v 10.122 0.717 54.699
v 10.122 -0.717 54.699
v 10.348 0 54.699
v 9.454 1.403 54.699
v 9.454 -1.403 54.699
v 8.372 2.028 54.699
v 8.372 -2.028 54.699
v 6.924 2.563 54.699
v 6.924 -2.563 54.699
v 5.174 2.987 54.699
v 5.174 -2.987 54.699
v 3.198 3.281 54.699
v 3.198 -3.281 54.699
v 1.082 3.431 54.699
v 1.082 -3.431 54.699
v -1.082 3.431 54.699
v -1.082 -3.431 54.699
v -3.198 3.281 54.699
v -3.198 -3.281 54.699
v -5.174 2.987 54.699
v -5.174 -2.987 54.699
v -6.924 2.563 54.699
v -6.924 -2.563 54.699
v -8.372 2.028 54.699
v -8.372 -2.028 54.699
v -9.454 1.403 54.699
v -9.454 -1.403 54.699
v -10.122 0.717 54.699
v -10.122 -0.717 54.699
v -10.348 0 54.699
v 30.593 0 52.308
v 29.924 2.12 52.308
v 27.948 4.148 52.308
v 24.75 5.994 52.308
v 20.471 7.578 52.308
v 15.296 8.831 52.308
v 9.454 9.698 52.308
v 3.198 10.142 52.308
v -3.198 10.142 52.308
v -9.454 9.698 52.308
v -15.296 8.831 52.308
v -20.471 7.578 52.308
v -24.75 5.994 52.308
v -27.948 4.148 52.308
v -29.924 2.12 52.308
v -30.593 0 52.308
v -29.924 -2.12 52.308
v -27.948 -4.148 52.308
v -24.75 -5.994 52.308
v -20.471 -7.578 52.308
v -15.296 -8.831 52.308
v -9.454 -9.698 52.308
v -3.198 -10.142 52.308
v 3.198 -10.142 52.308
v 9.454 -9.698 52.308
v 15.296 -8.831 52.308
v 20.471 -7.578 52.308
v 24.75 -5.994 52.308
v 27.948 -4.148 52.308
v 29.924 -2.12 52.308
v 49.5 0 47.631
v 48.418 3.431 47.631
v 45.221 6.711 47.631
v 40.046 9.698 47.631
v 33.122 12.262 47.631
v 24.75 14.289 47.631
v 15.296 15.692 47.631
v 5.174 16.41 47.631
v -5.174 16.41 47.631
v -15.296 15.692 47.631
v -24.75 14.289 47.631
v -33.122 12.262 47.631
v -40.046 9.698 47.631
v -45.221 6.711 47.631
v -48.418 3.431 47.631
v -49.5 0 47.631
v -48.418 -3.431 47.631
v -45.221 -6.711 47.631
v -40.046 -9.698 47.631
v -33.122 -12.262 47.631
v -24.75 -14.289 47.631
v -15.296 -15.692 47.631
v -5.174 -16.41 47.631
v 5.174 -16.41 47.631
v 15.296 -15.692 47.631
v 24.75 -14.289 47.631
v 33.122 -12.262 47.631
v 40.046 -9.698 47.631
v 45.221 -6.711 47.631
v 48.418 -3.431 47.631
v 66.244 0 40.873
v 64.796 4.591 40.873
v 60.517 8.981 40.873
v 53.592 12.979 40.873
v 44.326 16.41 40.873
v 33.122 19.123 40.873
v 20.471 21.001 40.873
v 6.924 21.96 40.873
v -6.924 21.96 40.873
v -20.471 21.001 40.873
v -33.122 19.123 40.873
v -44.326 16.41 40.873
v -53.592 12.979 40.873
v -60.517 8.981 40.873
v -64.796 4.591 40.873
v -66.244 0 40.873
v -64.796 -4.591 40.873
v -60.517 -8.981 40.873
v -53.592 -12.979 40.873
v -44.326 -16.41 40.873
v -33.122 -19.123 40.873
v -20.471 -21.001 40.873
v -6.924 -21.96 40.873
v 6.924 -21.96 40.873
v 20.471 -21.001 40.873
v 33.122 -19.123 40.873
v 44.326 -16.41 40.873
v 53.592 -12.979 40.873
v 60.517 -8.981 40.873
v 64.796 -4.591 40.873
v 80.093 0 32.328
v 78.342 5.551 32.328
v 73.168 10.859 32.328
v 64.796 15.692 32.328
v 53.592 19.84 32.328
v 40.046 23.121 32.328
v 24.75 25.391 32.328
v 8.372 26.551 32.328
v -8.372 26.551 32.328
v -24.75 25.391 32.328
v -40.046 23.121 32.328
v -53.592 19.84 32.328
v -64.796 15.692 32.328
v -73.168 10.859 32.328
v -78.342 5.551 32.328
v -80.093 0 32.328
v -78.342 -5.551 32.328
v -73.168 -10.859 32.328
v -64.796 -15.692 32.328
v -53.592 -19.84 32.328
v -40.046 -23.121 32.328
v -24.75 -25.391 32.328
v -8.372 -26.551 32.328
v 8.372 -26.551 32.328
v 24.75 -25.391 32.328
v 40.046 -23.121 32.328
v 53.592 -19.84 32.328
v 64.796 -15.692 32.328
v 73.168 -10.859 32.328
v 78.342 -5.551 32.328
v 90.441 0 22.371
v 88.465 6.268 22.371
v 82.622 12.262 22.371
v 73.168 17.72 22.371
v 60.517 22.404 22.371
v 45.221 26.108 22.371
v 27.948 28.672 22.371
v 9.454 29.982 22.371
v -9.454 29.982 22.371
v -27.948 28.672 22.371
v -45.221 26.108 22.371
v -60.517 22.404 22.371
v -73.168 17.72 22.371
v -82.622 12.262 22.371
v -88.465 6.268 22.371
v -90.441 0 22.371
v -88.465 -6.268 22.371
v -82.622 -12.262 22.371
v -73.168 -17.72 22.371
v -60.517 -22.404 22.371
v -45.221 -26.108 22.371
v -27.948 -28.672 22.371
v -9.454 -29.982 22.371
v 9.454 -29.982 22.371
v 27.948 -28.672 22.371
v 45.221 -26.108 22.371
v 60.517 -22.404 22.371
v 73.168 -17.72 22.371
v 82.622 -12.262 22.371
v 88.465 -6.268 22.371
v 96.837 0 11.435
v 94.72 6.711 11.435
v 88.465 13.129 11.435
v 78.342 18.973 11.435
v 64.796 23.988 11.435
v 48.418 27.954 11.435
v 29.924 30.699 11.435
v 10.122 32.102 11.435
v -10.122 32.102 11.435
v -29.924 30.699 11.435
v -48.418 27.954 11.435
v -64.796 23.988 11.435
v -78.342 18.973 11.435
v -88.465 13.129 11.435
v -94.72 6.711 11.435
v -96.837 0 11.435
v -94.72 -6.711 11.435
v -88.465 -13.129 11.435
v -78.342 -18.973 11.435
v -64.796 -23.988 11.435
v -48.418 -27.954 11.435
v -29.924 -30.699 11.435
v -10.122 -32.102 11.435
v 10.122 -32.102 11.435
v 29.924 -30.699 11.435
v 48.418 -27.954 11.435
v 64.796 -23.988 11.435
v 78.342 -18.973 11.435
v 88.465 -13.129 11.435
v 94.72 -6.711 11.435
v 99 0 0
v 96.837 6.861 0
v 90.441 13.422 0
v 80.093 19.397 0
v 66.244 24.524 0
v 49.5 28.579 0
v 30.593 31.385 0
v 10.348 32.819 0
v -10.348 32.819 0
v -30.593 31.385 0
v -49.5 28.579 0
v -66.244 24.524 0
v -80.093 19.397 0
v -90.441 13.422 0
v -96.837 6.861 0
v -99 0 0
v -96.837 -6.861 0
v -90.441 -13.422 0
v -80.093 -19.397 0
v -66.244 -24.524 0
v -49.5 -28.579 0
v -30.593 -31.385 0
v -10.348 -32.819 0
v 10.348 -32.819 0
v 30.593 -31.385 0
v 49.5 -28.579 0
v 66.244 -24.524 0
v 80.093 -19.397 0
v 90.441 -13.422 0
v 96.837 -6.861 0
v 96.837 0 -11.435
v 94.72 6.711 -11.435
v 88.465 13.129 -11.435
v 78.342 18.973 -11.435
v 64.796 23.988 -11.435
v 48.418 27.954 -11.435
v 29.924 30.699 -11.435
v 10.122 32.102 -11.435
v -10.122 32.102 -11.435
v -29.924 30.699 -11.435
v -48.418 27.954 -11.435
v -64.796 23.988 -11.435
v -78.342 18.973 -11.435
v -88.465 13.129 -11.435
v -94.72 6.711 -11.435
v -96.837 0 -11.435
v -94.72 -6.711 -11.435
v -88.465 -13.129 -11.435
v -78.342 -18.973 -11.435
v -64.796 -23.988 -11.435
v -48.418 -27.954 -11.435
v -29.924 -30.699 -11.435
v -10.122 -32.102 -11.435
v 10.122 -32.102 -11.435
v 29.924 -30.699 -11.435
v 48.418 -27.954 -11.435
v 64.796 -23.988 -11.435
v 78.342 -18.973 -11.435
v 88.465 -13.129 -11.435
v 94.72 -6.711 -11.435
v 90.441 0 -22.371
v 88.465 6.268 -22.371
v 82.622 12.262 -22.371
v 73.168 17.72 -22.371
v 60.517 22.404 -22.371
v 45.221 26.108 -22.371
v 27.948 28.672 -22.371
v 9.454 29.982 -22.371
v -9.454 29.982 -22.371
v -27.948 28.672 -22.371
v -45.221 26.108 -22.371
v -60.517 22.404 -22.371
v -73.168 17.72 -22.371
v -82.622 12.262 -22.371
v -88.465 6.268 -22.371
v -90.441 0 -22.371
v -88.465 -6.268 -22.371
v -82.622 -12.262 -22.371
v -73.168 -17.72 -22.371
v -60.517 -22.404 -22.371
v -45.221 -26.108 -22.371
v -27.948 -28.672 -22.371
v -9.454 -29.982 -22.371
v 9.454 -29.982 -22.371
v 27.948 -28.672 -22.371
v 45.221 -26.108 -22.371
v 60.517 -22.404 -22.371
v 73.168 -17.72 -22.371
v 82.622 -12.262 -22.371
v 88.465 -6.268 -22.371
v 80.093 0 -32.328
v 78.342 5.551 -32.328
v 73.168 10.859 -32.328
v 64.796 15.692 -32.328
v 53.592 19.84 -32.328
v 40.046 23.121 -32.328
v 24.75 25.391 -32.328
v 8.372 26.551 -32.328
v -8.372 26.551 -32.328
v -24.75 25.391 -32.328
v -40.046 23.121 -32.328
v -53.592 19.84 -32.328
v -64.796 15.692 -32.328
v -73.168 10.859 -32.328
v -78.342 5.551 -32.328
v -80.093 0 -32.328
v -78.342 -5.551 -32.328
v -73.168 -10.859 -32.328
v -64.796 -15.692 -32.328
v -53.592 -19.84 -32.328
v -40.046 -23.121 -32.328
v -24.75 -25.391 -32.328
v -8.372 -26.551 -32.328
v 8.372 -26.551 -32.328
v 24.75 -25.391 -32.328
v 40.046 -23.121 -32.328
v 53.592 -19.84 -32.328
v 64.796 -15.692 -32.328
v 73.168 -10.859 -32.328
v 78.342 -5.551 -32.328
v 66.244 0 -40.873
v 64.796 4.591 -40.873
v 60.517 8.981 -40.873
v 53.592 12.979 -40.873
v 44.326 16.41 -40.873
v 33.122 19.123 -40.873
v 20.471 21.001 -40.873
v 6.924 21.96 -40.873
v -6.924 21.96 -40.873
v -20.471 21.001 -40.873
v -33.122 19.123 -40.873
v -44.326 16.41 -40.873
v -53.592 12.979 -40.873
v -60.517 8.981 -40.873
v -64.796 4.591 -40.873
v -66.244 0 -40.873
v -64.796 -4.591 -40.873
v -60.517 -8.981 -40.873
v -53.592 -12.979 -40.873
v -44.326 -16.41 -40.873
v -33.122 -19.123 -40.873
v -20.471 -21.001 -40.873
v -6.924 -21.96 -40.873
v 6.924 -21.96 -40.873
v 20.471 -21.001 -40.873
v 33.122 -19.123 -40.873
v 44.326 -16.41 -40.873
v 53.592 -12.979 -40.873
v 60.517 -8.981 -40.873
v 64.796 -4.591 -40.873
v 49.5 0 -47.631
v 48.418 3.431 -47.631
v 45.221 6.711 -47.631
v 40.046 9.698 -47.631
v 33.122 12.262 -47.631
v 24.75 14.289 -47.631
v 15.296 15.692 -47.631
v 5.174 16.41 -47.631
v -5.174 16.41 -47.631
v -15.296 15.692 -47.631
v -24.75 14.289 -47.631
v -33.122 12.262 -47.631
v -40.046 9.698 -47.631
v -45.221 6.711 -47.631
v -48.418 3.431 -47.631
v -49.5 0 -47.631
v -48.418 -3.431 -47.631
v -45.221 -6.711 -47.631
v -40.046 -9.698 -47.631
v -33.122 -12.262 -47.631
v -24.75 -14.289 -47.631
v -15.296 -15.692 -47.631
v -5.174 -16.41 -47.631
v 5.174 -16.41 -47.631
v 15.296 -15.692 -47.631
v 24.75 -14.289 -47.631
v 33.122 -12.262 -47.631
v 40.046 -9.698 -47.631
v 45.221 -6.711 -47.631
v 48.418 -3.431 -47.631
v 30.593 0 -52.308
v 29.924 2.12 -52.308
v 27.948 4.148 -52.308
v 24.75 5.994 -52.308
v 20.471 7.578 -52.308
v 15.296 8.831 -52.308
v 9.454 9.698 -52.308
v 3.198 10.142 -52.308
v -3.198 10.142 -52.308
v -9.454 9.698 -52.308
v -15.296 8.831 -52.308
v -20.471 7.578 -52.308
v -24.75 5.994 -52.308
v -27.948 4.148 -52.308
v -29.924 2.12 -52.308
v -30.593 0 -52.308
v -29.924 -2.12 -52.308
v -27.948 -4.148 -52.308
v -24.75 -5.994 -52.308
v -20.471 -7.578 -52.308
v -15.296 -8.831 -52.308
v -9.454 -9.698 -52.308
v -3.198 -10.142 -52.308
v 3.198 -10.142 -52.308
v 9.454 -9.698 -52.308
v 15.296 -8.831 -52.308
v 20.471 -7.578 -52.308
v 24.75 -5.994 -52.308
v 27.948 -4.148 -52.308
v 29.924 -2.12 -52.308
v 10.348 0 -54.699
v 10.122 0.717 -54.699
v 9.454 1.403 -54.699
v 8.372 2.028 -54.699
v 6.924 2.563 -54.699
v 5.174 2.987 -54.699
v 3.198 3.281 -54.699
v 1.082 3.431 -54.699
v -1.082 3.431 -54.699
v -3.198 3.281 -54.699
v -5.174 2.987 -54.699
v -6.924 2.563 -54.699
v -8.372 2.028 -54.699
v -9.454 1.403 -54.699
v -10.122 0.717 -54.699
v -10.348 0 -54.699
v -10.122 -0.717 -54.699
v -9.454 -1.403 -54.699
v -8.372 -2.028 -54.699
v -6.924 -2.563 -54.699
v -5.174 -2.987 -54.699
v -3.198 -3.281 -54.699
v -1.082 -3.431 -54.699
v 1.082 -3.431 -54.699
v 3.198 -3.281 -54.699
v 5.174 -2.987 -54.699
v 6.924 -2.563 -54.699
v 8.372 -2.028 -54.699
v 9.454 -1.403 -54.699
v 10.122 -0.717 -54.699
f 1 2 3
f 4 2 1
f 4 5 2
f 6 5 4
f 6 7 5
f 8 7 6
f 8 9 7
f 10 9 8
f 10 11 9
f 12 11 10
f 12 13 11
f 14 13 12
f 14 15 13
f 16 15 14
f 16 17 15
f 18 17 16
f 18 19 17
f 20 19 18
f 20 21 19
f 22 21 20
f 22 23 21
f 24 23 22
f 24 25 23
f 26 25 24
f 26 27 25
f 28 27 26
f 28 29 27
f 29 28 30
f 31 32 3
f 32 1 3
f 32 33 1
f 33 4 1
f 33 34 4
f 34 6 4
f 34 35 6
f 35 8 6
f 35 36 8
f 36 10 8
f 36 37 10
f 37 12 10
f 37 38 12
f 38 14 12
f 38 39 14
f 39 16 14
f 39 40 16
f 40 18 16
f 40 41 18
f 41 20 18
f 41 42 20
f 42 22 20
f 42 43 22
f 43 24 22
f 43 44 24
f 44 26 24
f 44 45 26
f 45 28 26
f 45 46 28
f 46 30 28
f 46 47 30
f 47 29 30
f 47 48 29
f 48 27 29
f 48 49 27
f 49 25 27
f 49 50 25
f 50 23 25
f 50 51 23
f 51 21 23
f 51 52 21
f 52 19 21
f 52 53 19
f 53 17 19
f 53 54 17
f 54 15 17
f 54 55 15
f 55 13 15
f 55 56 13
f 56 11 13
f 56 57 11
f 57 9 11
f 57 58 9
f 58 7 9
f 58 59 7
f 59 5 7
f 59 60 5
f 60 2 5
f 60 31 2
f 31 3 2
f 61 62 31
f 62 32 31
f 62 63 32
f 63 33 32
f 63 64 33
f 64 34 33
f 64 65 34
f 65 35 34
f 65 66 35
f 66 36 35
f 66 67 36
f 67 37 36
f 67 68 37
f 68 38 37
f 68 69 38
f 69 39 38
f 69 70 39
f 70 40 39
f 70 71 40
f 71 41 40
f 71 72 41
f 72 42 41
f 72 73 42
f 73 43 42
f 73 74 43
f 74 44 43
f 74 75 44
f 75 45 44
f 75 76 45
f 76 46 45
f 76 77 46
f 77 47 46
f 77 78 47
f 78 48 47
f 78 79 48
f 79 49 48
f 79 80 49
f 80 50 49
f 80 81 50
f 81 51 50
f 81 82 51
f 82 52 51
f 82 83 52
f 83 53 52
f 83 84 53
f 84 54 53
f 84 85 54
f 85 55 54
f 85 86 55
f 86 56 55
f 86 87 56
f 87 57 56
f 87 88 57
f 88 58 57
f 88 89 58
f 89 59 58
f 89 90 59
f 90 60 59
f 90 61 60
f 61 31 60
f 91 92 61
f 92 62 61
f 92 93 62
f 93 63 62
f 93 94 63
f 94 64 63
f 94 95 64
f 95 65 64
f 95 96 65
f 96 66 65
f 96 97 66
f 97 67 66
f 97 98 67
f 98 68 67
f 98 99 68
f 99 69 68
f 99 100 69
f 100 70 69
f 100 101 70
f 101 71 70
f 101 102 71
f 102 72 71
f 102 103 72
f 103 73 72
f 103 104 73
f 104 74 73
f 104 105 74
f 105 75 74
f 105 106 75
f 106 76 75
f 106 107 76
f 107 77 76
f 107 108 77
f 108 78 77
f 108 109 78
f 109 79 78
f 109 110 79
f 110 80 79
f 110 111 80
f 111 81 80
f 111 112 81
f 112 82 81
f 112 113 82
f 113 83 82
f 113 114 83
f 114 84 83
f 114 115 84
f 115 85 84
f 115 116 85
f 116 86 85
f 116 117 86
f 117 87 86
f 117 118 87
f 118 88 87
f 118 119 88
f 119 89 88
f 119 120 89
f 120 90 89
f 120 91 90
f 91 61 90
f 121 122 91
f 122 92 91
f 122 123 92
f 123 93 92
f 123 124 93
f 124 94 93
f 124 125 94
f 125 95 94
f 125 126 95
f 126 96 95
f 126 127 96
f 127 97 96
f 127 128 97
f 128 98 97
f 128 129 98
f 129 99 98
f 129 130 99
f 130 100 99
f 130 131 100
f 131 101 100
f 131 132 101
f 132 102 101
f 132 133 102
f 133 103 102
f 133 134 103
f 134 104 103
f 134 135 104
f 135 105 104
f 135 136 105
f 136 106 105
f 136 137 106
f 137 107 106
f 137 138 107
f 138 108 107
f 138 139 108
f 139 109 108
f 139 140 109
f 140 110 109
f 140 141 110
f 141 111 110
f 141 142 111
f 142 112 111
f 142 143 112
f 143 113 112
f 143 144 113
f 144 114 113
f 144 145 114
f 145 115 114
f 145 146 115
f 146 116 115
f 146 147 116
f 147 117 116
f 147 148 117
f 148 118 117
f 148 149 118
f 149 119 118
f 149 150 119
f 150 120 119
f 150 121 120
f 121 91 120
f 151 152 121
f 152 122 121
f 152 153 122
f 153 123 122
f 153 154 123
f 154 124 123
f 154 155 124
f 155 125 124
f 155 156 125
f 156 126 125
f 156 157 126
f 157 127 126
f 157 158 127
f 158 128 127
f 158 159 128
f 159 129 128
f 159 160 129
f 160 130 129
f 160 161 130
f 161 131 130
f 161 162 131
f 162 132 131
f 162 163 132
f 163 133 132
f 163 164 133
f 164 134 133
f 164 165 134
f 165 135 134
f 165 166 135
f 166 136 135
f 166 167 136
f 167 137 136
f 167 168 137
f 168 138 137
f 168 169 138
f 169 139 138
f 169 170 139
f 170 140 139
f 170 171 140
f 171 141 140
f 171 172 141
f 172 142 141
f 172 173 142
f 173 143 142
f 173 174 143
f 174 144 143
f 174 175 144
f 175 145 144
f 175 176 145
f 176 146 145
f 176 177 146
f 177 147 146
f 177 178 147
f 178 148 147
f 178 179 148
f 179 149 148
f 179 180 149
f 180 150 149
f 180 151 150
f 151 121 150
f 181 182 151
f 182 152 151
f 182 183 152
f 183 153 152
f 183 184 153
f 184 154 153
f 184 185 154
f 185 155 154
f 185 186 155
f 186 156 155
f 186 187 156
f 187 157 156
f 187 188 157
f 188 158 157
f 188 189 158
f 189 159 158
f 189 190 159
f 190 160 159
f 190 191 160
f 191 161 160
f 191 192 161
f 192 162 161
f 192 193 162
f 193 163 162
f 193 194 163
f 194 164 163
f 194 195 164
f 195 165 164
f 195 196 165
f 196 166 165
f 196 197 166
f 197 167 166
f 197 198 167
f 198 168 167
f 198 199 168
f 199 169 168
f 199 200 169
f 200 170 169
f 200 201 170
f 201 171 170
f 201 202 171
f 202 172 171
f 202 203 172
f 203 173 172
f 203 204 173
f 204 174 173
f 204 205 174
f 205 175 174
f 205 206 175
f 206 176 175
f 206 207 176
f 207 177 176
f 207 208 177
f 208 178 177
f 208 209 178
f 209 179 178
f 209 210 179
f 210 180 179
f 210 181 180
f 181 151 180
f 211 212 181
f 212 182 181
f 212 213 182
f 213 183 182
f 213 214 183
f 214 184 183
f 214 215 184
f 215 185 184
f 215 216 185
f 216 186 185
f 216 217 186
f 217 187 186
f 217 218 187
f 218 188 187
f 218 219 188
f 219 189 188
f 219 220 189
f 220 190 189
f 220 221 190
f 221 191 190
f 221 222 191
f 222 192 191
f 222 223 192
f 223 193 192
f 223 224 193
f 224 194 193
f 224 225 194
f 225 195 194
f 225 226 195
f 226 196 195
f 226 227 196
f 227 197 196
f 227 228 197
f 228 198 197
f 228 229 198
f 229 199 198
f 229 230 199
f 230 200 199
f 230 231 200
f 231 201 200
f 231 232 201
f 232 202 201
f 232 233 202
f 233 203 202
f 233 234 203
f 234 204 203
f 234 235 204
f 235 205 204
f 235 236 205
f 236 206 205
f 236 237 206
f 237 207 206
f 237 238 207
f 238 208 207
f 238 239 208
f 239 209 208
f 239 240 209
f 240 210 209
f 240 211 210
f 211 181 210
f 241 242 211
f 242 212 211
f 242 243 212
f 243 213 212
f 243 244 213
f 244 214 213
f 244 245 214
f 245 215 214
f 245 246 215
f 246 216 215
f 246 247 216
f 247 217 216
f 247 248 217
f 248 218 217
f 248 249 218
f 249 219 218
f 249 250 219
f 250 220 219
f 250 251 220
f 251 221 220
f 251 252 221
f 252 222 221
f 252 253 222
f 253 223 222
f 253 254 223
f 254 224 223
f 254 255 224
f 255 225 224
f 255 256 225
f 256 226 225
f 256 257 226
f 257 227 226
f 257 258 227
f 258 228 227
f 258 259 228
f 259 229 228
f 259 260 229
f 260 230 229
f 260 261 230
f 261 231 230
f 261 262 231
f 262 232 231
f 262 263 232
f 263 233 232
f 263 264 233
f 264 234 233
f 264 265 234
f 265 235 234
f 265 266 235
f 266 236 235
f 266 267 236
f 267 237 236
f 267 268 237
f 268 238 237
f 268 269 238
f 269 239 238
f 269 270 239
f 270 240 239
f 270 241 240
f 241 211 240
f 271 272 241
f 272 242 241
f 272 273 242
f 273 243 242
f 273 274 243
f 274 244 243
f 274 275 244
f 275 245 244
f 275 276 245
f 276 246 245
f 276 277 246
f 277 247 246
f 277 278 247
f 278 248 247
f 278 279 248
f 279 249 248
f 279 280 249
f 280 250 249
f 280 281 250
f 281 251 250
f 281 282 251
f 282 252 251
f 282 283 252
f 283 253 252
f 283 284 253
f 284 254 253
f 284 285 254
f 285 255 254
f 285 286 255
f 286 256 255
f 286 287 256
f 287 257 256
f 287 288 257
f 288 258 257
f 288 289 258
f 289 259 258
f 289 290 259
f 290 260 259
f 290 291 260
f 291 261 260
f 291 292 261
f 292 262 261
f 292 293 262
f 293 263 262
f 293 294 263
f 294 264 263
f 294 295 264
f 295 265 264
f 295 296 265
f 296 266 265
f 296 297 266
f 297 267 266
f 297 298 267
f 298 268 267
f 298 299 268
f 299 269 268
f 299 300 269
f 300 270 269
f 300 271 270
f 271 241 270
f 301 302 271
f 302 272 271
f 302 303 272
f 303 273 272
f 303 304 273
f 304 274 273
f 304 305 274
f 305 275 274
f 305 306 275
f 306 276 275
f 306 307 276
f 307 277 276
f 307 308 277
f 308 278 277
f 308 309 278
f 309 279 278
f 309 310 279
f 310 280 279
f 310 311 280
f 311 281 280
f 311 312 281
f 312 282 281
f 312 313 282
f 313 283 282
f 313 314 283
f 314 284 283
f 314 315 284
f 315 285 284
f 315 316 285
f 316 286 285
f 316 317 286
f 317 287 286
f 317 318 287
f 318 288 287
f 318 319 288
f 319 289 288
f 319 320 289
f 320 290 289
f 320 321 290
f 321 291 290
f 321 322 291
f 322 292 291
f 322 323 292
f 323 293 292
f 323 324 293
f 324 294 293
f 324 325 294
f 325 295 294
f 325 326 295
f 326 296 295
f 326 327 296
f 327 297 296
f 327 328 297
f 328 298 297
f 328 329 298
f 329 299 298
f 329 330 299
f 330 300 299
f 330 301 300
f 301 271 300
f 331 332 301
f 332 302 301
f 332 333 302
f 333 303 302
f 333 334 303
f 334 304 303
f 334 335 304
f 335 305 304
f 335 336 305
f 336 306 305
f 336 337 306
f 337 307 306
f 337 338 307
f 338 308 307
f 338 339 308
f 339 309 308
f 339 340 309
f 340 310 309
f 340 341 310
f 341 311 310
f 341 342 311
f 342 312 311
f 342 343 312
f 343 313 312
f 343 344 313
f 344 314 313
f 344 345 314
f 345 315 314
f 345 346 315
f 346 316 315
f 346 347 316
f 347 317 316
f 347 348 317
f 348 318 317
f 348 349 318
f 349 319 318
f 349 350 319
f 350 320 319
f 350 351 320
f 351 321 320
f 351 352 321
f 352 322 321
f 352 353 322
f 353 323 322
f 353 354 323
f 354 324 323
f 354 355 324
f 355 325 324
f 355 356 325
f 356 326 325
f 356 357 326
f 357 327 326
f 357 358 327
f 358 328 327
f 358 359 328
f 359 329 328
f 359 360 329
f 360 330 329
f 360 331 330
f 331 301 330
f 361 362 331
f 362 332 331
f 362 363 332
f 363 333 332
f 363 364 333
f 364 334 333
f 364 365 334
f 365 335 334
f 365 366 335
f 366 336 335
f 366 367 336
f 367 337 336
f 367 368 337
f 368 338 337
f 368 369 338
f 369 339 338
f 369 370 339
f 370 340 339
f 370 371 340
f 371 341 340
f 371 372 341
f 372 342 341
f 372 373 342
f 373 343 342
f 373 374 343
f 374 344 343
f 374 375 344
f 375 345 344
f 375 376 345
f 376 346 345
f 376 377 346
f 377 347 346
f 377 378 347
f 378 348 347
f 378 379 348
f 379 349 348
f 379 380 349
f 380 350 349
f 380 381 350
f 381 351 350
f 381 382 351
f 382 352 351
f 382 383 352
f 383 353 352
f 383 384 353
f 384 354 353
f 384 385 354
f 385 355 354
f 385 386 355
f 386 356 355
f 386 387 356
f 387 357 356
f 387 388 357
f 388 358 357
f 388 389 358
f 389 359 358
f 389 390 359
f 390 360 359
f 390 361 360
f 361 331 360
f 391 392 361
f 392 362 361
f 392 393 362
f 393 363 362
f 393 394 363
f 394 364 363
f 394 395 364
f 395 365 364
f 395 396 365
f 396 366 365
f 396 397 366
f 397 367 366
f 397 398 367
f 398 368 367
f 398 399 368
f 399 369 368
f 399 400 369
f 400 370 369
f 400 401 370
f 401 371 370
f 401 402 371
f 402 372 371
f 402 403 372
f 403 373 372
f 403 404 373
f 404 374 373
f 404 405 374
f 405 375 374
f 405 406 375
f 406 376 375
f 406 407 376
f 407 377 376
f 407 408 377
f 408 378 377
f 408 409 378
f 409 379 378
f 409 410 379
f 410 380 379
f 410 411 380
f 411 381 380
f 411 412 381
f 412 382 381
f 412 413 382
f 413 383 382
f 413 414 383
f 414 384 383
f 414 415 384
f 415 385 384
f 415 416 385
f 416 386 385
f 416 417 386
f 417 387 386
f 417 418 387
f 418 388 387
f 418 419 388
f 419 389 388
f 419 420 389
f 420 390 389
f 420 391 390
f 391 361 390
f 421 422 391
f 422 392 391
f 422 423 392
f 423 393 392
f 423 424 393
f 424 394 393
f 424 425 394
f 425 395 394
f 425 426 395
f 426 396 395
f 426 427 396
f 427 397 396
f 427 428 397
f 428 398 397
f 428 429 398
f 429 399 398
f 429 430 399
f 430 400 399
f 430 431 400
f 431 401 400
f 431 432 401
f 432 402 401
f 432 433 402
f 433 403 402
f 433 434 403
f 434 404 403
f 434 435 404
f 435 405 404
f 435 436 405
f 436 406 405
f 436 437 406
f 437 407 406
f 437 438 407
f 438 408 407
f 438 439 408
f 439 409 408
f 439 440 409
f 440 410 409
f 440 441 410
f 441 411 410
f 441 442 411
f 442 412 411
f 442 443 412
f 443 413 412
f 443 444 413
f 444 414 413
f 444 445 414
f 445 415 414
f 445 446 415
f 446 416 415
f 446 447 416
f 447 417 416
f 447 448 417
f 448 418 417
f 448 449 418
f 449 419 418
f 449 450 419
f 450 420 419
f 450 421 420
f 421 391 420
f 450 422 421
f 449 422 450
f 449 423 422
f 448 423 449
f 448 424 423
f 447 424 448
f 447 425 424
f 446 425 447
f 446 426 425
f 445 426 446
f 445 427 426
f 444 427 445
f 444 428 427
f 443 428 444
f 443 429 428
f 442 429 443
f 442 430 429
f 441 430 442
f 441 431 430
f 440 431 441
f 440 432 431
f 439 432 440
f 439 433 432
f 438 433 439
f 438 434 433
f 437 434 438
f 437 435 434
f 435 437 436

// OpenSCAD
// Generated by SolidPython 1.0.1 on 2020-07-29 00:46:48


scale(v = [9, 3, 5]) {
	sphere(r = 11);
}
/***********************************************
*********      SolidPython code:      **********
************************************************
 
# import packages: SolidPython
from solid import *
from solid.utils import *
from itertools import chain, combinations, permutations


class Resize:

    def __init__(self, scad_file):
        self.scad_file = scad_file
        #self.scad_file = import_scad(scad_file)
        # cone/cylinder param:
        self.r1 = 0
        self.r2 = 0
        self.h = 0
        # rectangular prism param:
        self.w = 0
        self.l = 0
        # ellipse param:
        self.r = 0

    # import OpenScad code (file name corresponds to shape)


    # classify shape + parameters
    def assign(self, param1, param2, param3):
        if self.scad_file == 'cone.scad':
            self.r1 = param1
            self.r2 = param2
            self.h = param3
        elif self.scad_file == 'cylinder.scad':
            self.r1 = param1
            self.r2 = param2
            self.h = param3
        elif self.scad_file == 'rectangularPrism.scad':
            self.h = param1
            self.l = param2
            self.w = param3
        else:
            self.r = param1
            self.h = param2

    # resize parameters
    def iterate(self):
        x = range(3, 20, 2)
        i = 1
        if self.scad_file == 'cone.scad':
            tempList = list(permutations(x, 2))
            for temp in tempList:
                param1 = temp[0]
                param2 = temp[1]
                filepath = 'produced_scad_files/' + 'cone' + str(param1) + '_' + str(param2) + '_' + '.scad'
                scad_render_to_file(cylinder(h=param1, r1=param2, r2=0), filepath)

        elif self.scad_file == 'cylinder.scad':
            tempList = list(permutations(x, 3))
            for temp in tempList:
                param1 = temp[0]
                param2 = temp[1]
                filepath = 'produced_scad_files/' + 'cylinder' + str(param1) + '_' + str(param2) + '_' + '.scad'
                scad_render_to_file(cylinder(h=param1, r1=param2, r2=param2), filepath)

        elif self.scad_file == 'rectangularPrism.scad':
            tempList = list(permutations(x, 3))
            for temp in tempList:
                param1 = temp[0]
                param2 = temp[1]
                param3 = temp[2]
                filepath = 'produced_scad_files/' + 'rectangularPrism' + str(param1) + '_' + str(param2) + '_' + str(
                    param3) + '.scad'
                scad_render_to_file(cube(size=(param1, param2, param3)), filepath)

        elif self.scad_file == 'ellipse.scad':
            tempList = list(permutations(x, 4))
            for temp in tempList:
                param1 = temp[0]
                param2 = temp[1]
                param3 = temp[2]
                param4 = temp[3]
                filepath = 'produced_scad_files/' + 'ellipse' + str(param1) + '_' + str(param2) + '_' + str(param3) + '_' + str(param4) + '.scad'
                scad_render_to_file(scale([param1, param2, param3])(sphere(r=param4)), filepath)

    def render_to_scadfile(self):
        scad_render_to_file(scad, 'example.scad') 
 
************************************************/
